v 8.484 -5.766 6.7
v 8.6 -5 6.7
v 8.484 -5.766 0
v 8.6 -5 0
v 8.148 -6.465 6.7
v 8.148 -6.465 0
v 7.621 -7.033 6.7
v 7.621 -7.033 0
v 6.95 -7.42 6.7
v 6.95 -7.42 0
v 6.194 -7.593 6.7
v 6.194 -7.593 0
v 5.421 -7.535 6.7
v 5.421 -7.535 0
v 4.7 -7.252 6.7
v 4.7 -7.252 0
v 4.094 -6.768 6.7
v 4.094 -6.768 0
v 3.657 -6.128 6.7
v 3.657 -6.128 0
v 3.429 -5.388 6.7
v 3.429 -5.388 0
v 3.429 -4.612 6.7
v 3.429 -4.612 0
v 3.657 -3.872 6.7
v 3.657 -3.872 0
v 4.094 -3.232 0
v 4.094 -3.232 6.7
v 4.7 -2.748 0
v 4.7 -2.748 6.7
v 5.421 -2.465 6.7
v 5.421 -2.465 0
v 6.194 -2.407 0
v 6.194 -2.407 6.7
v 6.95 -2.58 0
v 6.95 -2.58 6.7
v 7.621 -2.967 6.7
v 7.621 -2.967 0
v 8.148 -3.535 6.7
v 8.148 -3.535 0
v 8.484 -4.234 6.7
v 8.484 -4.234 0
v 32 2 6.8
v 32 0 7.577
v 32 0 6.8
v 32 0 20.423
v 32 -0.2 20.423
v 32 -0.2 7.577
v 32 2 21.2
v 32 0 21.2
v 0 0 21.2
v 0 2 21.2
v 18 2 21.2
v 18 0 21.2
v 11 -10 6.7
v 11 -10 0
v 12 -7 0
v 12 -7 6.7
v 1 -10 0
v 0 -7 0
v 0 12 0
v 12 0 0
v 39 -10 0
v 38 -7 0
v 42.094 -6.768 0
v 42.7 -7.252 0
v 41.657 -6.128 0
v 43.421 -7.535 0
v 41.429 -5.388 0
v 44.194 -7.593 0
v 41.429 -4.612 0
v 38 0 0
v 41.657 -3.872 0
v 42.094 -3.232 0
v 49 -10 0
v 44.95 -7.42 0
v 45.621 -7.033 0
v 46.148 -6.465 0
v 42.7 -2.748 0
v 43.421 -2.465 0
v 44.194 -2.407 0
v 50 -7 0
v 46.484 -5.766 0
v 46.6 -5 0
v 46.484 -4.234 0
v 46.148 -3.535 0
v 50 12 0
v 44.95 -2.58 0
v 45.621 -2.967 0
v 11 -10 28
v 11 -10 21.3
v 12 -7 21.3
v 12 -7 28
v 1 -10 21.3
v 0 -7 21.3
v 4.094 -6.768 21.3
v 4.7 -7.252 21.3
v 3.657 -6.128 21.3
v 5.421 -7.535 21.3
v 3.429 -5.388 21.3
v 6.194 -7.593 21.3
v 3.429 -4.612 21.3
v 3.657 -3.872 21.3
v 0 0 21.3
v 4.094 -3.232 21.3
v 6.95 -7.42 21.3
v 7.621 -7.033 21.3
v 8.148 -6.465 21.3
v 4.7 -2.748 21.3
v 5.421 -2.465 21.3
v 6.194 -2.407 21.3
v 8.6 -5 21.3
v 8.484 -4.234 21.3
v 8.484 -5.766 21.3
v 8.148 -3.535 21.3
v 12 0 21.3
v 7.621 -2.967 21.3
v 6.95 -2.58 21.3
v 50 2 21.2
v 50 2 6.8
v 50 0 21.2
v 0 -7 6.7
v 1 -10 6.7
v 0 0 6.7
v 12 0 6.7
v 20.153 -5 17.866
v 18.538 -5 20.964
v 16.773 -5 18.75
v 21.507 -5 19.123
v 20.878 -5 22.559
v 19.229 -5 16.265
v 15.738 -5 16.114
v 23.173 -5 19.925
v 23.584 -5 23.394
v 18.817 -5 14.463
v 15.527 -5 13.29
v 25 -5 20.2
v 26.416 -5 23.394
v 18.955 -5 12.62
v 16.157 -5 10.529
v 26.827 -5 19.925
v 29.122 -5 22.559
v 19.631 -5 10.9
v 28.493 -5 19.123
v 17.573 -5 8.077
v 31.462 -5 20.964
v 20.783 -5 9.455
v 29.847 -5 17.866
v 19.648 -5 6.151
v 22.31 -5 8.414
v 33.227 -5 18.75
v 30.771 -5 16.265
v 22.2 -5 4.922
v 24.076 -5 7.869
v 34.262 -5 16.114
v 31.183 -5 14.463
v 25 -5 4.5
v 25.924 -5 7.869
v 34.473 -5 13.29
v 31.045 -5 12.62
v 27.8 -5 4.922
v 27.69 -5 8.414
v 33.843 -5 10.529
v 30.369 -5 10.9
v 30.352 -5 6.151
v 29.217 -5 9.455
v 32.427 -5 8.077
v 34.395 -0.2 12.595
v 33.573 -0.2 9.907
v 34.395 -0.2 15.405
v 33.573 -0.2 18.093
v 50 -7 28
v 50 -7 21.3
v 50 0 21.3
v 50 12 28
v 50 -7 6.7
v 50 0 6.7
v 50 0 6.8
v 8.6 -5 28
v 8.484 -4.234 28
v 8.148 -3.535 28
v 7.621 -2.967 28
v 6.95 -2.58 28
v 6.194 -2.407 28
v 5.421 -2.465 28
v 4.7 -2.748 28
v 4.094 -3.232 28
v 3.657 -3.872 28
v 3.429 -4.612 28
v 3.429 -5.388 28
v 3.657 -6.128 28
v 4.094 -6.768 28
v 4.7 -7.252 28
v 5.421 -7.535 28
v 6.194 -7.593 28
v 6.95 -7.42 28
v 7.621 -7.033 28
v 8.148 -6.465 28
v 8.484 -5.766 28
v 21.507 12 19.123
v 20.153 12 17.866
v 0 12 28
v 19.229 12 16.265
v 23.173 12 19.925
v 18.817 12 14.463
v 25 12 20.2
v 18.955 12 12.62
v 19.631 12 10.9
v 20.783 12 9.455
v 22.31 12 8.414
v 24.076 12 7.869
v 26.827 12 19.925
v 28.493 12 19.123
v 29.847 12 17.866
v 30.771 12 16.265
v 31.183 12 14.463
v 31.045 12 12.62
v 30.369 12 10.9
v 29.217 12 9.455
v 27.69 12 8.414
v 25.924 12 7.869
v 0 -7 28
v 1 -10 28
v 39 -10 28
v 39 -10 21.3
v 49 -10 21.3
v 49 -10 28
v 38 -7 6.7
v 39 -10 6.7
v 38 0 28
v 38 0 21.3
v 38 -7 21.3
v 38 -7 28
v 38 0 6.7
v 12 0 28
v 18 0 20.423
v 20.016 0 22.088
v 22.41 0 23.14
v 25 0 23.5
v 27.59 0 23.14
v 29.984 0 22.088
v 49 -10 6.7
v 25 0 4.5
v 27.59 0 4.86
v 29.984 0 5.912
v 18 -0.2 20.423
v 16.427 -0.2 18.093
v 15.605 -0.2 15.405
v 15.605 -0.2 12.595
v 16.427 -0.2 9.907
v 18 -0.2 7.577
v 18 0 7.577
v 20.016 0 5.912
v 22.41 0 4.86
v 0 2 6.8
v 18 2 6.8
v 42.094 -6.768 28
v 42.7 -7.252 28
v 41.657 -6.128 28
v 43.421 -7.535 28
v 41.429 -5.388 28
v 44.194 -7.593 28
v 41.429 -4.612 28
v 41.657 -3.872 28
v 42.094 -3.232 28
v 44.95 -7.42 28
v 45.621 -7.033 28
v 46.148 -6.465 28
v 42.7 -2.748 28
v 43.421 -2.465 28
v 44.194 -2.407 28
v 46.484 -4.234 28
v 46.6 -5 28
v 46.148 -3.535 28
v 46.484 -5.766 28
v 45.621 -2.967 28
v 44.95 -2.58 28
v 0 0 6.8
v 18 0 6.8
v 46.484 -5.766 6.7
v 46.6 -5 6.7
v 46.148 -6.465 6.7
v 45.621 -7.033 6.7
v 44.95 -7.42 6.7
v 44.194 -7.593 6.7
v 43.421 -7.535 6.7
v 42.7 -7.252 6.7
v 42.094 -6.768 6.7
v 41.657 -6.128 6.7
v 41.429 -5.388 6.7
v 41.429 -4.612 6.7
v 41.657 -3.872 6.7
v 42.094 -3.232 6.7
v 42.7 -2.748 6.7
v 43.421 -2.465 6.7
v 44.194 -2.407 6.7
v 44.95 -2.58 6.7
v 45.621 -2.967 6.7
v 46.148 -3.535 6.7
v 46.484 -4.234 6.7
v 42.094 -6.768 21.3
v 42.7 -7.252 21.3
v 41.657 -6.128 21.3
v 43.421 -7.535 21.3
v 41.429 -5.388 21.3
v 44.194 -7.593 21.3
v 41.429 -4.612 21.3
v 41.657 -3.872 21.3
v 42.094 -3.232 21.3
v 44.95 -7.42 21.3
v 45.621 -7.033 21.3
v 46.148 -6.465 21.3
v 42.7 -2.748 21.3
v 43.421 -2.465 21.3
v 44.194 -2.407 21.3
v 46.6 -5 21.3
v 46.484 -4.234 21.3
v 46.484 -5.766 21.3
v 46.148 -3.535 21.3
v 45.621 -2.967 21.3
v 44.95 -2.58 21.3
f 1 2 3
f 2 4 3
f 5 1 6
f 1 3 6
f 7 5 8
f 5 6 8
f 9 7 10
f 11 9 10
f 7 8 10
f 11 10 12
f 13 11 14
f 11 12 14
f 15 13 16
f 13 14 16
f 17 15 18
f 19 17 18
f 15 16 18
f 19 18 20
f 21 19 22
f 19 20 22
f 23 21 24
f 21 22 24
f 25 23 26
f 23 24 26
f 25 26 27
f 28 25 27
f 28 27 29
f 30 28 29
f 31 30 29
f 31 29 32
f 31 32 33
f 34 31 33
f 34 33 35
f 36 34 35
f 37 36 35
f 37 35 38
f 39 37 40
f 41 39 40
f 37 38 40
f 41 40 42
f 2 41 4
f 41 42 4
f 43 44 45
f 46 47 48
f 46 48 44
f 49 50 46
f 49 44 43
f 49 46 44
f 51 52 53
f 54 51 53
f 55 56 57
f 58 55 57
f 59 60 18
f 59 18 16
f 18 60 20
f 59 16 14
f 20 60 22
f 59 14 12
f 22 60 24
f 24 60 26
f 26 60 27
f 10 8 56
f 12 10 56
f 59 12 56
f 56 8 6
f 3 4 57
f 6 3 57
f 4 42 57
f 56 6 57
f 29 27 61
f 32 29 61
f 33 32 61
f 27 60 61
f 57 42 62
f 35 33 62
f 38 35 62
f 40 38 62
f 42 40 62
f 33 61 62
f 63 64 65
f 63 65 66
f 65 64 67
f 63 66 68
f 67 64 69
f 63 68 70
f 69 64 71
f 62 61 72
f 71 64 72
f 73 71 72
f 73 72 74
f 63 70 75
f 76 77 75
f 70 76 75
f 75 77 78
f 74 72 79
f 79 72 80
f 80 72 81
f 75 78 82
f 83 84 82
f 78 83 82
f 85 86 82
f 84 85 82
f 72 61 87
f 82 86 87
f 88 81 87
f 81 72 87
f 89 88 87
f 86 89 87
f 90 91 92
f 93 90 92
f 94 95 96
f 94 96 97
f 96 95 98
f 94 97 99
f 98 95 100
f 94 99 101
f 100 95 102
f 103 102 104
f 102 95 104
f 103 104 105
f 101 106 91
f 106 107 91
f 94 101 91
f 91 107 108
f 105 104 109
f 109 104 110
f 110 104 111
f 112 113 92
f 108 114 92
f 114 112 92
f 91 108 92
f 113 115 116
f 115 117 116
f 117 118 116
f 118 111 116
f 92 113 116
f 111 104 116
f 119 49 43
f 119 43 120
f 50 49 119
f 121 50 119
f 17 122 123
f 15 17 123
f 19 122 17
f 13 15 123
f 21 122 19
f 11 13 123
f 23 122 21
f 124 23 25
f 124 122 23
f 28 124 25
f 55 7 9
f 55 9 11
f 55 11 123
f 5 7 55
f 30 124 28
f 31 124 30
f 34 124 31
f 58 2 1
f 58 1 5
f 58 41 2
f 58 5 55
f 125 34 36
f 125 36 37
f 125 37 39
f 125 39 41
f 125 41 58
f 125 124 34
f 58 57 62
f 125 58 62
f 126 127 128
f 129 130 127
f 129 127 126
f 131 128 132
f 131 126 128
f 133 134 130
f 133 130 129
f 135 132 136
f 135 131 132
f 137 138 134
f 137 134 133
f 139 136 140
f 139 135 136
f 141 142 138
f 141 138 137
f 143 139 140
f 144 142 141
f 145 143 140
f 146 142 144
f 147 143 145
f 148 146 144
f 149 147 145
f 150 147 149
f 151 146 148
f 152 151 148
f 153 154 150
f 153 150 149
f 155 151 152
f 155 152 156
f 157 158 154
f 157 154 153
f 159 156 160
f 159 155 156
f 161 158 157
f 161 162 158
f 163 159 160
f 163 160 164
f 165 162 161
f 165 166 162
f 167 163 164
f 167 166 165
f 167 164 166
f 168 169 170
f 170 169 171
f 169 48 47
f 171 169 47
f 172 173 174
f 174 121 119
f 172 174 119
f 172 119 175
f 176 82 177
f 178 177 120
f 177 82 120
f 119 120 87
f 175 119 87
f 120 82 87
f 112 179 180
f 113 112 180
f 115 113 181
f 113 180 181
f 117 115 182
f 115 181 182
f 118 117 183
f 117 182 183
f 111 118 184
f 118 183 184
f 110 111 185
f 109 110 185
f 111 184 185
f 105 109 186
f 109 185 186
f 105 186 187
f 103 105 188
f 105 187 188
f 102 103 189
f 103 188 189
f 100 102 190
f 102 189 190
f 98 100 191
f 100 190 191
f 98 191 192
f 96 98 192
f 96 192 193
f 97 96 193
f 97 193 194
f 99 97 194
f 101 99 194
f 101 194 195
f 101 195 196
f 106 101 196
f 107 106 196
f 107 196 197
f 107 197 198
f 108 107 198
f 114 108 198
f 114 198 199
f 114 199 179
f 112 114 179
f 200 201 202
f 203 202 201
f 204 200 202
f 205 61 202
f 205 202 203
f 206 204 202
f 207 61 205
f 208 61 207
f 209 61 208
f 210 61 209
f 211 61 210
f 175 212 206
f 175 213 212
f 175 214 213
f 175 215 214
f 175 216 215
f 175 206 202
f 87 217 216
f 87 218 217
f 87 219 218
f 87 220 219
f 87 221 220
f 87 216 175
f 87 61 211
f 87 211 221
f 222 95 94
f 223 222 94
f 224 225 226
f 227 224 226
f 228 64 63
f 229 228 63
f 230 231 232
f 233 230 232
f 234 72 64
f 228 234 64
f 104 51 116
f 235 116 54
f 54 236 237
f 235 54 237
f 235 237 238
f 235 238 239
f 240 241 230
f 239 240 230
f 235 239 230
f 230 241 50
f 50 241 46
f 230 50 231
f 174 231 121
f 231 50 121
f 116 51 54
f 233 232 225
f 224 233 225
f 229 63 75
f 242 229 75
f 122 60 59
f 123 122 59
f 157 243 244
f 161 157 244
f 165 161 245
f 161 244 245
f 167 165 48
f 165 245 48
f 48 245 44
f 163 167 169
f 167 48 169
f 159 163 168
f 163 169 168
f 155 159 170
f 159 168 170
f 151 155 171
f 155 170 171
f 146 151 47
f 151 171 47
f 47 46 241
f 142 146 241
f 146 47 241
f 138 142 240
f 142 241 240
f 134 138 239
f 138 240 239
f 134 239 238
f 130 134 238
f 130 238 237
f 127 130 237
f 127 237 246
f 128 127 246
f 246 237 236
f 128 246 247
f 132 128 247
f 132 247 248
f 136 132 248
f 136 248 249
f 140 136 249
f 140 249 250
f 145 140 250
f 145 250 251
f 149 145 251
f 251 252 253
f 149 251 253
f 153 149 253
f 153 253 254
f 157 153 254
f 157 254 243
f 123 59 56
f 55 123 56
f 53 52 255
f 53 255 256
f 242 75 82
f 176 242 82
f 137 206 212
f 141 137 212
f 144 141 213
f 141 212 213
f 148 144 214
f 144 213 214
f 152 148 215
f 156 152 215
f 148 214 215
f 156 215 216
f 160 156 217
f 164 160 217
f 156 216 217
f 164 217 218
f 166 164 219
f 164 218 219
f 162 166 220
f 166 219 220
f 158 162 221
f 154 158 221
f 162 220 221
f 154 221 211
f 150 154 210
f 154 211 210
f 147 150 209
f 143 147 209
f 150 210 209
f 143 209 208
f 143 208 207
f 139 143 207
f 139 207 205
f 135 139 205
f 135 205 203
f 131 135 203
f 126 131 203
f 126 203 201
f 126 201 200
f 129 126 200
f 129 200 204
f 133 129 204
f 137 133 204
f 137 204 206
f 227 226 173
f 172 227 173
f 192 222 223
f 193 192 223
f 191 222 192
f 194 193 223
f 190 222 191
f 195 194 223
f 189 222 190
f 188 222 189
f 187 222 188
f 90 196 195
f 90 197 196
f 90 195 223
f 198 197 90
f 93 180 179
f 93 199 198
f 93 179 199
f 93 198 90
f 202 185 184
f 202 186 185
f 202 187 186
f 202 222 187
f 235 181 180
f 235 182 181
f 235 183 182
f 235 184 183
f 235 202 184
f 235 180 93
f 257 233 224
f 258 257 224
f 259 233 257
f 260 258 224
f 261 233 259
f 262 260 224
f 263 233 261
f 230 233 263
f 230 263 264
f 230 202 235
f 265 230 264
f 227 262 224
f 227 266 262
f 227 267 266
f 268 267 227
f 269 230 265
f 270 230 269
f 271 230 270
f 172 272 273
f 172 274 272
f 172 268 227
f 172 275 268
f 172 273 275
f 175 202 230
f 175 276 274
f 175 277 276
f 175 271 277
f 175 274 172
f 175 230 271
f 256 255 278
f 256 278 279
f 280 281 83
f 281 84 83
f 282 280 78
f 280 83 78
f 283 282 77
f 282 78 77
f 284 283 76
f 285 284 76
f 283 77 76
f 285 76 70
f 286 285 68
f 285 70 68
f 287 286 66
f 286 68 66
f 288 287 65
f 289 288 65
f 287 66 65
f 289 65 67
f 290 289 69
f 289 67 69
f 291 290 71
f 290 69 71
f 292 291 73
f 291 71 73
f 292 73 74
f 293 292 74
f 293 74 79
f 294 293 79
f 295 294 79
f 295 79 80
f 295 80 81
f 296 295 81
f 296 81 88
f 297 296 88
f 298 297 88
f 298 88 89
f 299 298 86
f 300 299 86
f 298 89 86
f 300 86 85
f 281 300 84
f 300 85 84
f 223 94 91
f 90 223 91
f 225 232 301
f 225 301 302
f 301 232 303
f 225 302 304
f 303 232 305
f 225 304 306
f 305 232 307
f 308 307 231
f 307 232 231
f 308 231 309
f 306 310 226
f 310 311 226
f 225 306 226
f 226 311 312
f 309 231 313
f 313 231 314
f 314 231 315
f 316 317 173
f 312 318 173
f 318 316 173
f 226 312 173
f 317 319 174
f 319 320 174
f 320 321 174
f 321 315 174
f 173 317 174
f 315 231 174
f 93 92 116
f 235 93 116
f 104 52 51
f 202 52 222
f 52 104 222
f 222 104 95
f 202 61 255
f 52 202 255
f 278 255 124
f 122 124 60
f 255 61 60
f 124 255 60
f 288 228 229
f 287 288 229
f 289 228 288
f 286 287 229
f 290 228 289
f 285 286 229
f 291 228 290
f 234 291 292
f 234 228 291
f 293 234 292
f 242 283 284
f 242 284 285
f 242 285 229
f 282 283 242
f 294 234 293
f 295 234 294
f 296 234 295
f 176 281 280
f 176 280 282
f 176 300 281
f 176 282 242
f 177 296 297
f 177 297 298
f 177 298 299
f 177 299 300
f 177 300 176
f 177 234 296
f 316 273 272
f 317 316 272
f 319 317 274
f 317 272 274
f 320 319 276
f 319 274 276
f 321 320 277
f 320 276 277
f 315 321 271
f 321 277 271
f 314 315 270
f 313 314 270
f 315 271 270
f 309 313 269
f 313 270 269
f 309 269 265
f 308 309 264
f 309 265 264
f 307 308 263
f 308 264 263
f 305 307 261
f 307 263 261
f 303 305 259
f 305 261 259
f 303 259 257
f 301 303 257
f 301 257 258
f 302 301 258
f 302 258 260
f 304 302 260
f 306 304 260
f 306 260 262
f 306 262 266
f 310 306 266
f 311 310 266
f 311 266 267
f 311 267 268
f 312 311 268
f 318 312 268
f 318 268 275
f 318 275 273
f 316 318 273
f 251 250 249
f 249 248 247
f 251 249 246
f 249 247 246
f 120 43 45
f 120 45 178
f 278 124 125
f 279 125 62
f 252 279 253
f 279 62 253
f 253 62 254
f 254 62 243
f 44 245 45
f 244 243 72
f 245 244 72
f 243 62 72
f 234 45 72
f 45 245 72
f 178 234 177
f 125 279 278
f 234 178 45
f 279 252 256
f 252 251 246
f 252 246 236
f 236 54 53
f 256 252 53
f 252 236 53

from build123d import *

# Parameters (mm, degrees)
SKETCH_1_W                 = 50
SKETCH_1_H                 = 12
UPPER_CROSSBAR_DEPTH       = 28
SKETCH_2_R                 = 9.5
LOWER_GUIDE_SLEEVE_DEPTH   = 5
SKETCH_3_R                 = 6.2
SPINDLE_THROUGH_BORE_DEPTH = 60.774576536
UPPER_HINGE_EAR_DEPTH      = 6.7
SKETCH_6_R                 = 2.6
UPPER_HINGE_BORE_DEPTH     = 59.549124673
EXTRUDE_2_DEPTH            = 6.7
SKETCH_8_R                 = 2.6
CUT_EXTRUDE_2_DEPTH        = 59.549124673
OPPOSITE_HINGE_EAR_DEPTH   = 6.7
SKETCH_10_R                = 2.6
OPPOSITE_HINGE_BORE_DEPTH  = 59.549124673
EXTRUDE_4_DEPTH            = 6.7
SKETCH_12_R                = 2.6
CUT_EXTRUDE_4_DEPTH        = 59.549124673
SKETCH_14_W                = 20
SKETCH_14_H                = 2.2
ARM_SWING_CLEARANCE_DEPTH  = 7.2
SKETCH_15_W                = 20
SKETCH_15_H                = 2.2
CUT_EXTRUDE_6_DEPTH        = 7.2


with BuildPart() as part:
    # 草图1 → Upper_crossbar (new body)
    with BuildSketch(Plane.XY):
        with Locations((25, 6)):
            Rectangle(SKETCH_1_W, SKETCH_1_H)
    extrude(amount=UPPER_CROSSBAR_DEPTH)

    # 草图2 → Lower_guide_sleeve (add)
    with BuildSketch(Plane.XZ):
        with Locations(Location((25, 14, 0), (0, 0, 270))):
            Circle(SKETCH_2_R)
    extrude(amount=LOWER_GUIDE_SLEEVE_DEPTH)

    # 草图3 → Spindle_through_bore (cut, through all)
    with BuildSketch(Plane(origin=(0, 12, 0), x_dir=(1, 0, 0), z_dir=(0, 1, 0))):
        with Locations(Location((25, -14, 0), (0, 0, 270))):
            Circle(SKETCH_3_R)
    extrude(amount=-SPINDLE_THROUGH_BORE_DEPTH, mode=Mode.SUBTRACT)

    # 草图5 → Upper_hinge_ear (add)
    with BuildSketch(Plane.XY.offset(21.3)):
        Polygon((1, -10), (11, -10), (12, -7), (12, 1), (0, 1), (0, -7), align=None)
    extrude(amount=UPPER_HINGE_EAR_DEPTH)

    # 草图6 → Upper_hinge_bore (cut, through all)
    with BuildSketch(Plane.XY.offset(28)):
        with Locations((6, -5)):
            Circle(SKETCH_6_R)
    extrude(amount=-UPPER_HINGE_BORE_DEPTH, mode=Mode.SUBTRACT)

    # 草图7 → 凸台-拉伸2 (add)
    with BuildSketch(Plane.XY.offset(21.3)):
        Polygon((39, -10), (49, -10), (50, -7), (50, 1), (38, 1), (38, -7), align=None)
    extrude(amount=EXTRUDE_2_DEPTH)

    # 草图8 → 切除-拉伸2 (cut, through all)
    with BuildSketch(Plane.XY.offset(28)):
        with Locations((44, -5)):
            Circle(SKETCH_8_R)
    extrude(amount=-CUT_EXTRUDE_2_DEPTH, mode=Mode.SUBTRACT)

    # 草图9 → Opposite_hinge_ear (add)
    with BuildSketch(Plane.XY):
        Polygon((1, -10), (11, -10), (12, -7), (12, 1), (0, 1), (0, -7), align=None)
    extrude(amount=OPPOSITE_HINGE_EAR_DEPTH)

    # 草图10 → Opposite_hinge_bore (cut, through all)
    with BuildSketch(Plane(origin=(0, 0, 0), x_dir=(-1, 0, 0), z_dir=(0, 0, -1))):
        with Locations(Location((-6, -5, 0), (0, 0, 180))):
            Circle(SKETCH_10_R)
    extrude(amount=-OPPOSITE_HINGE_BORE_DEPTH, mode=Mode.SUBTRACT)

    # 草图11 → 凸台-拉伸4 (add)
    with BuildSketch(Plane.XY):
        Polygon((39, -10), (49, -10), (50, -7), (50, 1), (38, 1), (38, -7), align=None)
    extrude(amount=EXTRUDE_4_DEPTH)

    # 草图12 → 切除-拉伸4 (cut, through all)
    with BuildSketch(Plane(origin=(0, 0, 0), x_dir=(-1, 0, 0), z_dir=(0, 0, -1))):
        with Locations(Location((-44, -5, 0), (0, 0, 180))):
            Circle(SKETCH_12_R)
    extrude(amount=-CUT_EXTRUDE_4_DEPTH, mode=Mode.SUBTRACT)

    # 草图14 → Arm_swing_clearance (cut, symmetric)
    with BuildSketch(Plane.XY.offset(14)):
        with Locations((8, 0.9)):
            Rectangle(SKETCH_14_W, SKETCH_14_H)
    extrude(amount=ARM_SWING_CLEARANCE_DEPTH, both=True, mode=Mode.SUBTRACT)

    # 草图15 → 切除-拉伸6 (cut, symmetric)
    with BuildSketch(Plane.XY.offset(14)):
        with Locations((42, 0.9)):
            Rectangle(SKETCH_15_W, SKETCH_15_H)
    extrude(amount=CUT_EXTRUDE_6_DEPTH, both=True, mode=Mode.SUBTRACT)


solid = part.part
